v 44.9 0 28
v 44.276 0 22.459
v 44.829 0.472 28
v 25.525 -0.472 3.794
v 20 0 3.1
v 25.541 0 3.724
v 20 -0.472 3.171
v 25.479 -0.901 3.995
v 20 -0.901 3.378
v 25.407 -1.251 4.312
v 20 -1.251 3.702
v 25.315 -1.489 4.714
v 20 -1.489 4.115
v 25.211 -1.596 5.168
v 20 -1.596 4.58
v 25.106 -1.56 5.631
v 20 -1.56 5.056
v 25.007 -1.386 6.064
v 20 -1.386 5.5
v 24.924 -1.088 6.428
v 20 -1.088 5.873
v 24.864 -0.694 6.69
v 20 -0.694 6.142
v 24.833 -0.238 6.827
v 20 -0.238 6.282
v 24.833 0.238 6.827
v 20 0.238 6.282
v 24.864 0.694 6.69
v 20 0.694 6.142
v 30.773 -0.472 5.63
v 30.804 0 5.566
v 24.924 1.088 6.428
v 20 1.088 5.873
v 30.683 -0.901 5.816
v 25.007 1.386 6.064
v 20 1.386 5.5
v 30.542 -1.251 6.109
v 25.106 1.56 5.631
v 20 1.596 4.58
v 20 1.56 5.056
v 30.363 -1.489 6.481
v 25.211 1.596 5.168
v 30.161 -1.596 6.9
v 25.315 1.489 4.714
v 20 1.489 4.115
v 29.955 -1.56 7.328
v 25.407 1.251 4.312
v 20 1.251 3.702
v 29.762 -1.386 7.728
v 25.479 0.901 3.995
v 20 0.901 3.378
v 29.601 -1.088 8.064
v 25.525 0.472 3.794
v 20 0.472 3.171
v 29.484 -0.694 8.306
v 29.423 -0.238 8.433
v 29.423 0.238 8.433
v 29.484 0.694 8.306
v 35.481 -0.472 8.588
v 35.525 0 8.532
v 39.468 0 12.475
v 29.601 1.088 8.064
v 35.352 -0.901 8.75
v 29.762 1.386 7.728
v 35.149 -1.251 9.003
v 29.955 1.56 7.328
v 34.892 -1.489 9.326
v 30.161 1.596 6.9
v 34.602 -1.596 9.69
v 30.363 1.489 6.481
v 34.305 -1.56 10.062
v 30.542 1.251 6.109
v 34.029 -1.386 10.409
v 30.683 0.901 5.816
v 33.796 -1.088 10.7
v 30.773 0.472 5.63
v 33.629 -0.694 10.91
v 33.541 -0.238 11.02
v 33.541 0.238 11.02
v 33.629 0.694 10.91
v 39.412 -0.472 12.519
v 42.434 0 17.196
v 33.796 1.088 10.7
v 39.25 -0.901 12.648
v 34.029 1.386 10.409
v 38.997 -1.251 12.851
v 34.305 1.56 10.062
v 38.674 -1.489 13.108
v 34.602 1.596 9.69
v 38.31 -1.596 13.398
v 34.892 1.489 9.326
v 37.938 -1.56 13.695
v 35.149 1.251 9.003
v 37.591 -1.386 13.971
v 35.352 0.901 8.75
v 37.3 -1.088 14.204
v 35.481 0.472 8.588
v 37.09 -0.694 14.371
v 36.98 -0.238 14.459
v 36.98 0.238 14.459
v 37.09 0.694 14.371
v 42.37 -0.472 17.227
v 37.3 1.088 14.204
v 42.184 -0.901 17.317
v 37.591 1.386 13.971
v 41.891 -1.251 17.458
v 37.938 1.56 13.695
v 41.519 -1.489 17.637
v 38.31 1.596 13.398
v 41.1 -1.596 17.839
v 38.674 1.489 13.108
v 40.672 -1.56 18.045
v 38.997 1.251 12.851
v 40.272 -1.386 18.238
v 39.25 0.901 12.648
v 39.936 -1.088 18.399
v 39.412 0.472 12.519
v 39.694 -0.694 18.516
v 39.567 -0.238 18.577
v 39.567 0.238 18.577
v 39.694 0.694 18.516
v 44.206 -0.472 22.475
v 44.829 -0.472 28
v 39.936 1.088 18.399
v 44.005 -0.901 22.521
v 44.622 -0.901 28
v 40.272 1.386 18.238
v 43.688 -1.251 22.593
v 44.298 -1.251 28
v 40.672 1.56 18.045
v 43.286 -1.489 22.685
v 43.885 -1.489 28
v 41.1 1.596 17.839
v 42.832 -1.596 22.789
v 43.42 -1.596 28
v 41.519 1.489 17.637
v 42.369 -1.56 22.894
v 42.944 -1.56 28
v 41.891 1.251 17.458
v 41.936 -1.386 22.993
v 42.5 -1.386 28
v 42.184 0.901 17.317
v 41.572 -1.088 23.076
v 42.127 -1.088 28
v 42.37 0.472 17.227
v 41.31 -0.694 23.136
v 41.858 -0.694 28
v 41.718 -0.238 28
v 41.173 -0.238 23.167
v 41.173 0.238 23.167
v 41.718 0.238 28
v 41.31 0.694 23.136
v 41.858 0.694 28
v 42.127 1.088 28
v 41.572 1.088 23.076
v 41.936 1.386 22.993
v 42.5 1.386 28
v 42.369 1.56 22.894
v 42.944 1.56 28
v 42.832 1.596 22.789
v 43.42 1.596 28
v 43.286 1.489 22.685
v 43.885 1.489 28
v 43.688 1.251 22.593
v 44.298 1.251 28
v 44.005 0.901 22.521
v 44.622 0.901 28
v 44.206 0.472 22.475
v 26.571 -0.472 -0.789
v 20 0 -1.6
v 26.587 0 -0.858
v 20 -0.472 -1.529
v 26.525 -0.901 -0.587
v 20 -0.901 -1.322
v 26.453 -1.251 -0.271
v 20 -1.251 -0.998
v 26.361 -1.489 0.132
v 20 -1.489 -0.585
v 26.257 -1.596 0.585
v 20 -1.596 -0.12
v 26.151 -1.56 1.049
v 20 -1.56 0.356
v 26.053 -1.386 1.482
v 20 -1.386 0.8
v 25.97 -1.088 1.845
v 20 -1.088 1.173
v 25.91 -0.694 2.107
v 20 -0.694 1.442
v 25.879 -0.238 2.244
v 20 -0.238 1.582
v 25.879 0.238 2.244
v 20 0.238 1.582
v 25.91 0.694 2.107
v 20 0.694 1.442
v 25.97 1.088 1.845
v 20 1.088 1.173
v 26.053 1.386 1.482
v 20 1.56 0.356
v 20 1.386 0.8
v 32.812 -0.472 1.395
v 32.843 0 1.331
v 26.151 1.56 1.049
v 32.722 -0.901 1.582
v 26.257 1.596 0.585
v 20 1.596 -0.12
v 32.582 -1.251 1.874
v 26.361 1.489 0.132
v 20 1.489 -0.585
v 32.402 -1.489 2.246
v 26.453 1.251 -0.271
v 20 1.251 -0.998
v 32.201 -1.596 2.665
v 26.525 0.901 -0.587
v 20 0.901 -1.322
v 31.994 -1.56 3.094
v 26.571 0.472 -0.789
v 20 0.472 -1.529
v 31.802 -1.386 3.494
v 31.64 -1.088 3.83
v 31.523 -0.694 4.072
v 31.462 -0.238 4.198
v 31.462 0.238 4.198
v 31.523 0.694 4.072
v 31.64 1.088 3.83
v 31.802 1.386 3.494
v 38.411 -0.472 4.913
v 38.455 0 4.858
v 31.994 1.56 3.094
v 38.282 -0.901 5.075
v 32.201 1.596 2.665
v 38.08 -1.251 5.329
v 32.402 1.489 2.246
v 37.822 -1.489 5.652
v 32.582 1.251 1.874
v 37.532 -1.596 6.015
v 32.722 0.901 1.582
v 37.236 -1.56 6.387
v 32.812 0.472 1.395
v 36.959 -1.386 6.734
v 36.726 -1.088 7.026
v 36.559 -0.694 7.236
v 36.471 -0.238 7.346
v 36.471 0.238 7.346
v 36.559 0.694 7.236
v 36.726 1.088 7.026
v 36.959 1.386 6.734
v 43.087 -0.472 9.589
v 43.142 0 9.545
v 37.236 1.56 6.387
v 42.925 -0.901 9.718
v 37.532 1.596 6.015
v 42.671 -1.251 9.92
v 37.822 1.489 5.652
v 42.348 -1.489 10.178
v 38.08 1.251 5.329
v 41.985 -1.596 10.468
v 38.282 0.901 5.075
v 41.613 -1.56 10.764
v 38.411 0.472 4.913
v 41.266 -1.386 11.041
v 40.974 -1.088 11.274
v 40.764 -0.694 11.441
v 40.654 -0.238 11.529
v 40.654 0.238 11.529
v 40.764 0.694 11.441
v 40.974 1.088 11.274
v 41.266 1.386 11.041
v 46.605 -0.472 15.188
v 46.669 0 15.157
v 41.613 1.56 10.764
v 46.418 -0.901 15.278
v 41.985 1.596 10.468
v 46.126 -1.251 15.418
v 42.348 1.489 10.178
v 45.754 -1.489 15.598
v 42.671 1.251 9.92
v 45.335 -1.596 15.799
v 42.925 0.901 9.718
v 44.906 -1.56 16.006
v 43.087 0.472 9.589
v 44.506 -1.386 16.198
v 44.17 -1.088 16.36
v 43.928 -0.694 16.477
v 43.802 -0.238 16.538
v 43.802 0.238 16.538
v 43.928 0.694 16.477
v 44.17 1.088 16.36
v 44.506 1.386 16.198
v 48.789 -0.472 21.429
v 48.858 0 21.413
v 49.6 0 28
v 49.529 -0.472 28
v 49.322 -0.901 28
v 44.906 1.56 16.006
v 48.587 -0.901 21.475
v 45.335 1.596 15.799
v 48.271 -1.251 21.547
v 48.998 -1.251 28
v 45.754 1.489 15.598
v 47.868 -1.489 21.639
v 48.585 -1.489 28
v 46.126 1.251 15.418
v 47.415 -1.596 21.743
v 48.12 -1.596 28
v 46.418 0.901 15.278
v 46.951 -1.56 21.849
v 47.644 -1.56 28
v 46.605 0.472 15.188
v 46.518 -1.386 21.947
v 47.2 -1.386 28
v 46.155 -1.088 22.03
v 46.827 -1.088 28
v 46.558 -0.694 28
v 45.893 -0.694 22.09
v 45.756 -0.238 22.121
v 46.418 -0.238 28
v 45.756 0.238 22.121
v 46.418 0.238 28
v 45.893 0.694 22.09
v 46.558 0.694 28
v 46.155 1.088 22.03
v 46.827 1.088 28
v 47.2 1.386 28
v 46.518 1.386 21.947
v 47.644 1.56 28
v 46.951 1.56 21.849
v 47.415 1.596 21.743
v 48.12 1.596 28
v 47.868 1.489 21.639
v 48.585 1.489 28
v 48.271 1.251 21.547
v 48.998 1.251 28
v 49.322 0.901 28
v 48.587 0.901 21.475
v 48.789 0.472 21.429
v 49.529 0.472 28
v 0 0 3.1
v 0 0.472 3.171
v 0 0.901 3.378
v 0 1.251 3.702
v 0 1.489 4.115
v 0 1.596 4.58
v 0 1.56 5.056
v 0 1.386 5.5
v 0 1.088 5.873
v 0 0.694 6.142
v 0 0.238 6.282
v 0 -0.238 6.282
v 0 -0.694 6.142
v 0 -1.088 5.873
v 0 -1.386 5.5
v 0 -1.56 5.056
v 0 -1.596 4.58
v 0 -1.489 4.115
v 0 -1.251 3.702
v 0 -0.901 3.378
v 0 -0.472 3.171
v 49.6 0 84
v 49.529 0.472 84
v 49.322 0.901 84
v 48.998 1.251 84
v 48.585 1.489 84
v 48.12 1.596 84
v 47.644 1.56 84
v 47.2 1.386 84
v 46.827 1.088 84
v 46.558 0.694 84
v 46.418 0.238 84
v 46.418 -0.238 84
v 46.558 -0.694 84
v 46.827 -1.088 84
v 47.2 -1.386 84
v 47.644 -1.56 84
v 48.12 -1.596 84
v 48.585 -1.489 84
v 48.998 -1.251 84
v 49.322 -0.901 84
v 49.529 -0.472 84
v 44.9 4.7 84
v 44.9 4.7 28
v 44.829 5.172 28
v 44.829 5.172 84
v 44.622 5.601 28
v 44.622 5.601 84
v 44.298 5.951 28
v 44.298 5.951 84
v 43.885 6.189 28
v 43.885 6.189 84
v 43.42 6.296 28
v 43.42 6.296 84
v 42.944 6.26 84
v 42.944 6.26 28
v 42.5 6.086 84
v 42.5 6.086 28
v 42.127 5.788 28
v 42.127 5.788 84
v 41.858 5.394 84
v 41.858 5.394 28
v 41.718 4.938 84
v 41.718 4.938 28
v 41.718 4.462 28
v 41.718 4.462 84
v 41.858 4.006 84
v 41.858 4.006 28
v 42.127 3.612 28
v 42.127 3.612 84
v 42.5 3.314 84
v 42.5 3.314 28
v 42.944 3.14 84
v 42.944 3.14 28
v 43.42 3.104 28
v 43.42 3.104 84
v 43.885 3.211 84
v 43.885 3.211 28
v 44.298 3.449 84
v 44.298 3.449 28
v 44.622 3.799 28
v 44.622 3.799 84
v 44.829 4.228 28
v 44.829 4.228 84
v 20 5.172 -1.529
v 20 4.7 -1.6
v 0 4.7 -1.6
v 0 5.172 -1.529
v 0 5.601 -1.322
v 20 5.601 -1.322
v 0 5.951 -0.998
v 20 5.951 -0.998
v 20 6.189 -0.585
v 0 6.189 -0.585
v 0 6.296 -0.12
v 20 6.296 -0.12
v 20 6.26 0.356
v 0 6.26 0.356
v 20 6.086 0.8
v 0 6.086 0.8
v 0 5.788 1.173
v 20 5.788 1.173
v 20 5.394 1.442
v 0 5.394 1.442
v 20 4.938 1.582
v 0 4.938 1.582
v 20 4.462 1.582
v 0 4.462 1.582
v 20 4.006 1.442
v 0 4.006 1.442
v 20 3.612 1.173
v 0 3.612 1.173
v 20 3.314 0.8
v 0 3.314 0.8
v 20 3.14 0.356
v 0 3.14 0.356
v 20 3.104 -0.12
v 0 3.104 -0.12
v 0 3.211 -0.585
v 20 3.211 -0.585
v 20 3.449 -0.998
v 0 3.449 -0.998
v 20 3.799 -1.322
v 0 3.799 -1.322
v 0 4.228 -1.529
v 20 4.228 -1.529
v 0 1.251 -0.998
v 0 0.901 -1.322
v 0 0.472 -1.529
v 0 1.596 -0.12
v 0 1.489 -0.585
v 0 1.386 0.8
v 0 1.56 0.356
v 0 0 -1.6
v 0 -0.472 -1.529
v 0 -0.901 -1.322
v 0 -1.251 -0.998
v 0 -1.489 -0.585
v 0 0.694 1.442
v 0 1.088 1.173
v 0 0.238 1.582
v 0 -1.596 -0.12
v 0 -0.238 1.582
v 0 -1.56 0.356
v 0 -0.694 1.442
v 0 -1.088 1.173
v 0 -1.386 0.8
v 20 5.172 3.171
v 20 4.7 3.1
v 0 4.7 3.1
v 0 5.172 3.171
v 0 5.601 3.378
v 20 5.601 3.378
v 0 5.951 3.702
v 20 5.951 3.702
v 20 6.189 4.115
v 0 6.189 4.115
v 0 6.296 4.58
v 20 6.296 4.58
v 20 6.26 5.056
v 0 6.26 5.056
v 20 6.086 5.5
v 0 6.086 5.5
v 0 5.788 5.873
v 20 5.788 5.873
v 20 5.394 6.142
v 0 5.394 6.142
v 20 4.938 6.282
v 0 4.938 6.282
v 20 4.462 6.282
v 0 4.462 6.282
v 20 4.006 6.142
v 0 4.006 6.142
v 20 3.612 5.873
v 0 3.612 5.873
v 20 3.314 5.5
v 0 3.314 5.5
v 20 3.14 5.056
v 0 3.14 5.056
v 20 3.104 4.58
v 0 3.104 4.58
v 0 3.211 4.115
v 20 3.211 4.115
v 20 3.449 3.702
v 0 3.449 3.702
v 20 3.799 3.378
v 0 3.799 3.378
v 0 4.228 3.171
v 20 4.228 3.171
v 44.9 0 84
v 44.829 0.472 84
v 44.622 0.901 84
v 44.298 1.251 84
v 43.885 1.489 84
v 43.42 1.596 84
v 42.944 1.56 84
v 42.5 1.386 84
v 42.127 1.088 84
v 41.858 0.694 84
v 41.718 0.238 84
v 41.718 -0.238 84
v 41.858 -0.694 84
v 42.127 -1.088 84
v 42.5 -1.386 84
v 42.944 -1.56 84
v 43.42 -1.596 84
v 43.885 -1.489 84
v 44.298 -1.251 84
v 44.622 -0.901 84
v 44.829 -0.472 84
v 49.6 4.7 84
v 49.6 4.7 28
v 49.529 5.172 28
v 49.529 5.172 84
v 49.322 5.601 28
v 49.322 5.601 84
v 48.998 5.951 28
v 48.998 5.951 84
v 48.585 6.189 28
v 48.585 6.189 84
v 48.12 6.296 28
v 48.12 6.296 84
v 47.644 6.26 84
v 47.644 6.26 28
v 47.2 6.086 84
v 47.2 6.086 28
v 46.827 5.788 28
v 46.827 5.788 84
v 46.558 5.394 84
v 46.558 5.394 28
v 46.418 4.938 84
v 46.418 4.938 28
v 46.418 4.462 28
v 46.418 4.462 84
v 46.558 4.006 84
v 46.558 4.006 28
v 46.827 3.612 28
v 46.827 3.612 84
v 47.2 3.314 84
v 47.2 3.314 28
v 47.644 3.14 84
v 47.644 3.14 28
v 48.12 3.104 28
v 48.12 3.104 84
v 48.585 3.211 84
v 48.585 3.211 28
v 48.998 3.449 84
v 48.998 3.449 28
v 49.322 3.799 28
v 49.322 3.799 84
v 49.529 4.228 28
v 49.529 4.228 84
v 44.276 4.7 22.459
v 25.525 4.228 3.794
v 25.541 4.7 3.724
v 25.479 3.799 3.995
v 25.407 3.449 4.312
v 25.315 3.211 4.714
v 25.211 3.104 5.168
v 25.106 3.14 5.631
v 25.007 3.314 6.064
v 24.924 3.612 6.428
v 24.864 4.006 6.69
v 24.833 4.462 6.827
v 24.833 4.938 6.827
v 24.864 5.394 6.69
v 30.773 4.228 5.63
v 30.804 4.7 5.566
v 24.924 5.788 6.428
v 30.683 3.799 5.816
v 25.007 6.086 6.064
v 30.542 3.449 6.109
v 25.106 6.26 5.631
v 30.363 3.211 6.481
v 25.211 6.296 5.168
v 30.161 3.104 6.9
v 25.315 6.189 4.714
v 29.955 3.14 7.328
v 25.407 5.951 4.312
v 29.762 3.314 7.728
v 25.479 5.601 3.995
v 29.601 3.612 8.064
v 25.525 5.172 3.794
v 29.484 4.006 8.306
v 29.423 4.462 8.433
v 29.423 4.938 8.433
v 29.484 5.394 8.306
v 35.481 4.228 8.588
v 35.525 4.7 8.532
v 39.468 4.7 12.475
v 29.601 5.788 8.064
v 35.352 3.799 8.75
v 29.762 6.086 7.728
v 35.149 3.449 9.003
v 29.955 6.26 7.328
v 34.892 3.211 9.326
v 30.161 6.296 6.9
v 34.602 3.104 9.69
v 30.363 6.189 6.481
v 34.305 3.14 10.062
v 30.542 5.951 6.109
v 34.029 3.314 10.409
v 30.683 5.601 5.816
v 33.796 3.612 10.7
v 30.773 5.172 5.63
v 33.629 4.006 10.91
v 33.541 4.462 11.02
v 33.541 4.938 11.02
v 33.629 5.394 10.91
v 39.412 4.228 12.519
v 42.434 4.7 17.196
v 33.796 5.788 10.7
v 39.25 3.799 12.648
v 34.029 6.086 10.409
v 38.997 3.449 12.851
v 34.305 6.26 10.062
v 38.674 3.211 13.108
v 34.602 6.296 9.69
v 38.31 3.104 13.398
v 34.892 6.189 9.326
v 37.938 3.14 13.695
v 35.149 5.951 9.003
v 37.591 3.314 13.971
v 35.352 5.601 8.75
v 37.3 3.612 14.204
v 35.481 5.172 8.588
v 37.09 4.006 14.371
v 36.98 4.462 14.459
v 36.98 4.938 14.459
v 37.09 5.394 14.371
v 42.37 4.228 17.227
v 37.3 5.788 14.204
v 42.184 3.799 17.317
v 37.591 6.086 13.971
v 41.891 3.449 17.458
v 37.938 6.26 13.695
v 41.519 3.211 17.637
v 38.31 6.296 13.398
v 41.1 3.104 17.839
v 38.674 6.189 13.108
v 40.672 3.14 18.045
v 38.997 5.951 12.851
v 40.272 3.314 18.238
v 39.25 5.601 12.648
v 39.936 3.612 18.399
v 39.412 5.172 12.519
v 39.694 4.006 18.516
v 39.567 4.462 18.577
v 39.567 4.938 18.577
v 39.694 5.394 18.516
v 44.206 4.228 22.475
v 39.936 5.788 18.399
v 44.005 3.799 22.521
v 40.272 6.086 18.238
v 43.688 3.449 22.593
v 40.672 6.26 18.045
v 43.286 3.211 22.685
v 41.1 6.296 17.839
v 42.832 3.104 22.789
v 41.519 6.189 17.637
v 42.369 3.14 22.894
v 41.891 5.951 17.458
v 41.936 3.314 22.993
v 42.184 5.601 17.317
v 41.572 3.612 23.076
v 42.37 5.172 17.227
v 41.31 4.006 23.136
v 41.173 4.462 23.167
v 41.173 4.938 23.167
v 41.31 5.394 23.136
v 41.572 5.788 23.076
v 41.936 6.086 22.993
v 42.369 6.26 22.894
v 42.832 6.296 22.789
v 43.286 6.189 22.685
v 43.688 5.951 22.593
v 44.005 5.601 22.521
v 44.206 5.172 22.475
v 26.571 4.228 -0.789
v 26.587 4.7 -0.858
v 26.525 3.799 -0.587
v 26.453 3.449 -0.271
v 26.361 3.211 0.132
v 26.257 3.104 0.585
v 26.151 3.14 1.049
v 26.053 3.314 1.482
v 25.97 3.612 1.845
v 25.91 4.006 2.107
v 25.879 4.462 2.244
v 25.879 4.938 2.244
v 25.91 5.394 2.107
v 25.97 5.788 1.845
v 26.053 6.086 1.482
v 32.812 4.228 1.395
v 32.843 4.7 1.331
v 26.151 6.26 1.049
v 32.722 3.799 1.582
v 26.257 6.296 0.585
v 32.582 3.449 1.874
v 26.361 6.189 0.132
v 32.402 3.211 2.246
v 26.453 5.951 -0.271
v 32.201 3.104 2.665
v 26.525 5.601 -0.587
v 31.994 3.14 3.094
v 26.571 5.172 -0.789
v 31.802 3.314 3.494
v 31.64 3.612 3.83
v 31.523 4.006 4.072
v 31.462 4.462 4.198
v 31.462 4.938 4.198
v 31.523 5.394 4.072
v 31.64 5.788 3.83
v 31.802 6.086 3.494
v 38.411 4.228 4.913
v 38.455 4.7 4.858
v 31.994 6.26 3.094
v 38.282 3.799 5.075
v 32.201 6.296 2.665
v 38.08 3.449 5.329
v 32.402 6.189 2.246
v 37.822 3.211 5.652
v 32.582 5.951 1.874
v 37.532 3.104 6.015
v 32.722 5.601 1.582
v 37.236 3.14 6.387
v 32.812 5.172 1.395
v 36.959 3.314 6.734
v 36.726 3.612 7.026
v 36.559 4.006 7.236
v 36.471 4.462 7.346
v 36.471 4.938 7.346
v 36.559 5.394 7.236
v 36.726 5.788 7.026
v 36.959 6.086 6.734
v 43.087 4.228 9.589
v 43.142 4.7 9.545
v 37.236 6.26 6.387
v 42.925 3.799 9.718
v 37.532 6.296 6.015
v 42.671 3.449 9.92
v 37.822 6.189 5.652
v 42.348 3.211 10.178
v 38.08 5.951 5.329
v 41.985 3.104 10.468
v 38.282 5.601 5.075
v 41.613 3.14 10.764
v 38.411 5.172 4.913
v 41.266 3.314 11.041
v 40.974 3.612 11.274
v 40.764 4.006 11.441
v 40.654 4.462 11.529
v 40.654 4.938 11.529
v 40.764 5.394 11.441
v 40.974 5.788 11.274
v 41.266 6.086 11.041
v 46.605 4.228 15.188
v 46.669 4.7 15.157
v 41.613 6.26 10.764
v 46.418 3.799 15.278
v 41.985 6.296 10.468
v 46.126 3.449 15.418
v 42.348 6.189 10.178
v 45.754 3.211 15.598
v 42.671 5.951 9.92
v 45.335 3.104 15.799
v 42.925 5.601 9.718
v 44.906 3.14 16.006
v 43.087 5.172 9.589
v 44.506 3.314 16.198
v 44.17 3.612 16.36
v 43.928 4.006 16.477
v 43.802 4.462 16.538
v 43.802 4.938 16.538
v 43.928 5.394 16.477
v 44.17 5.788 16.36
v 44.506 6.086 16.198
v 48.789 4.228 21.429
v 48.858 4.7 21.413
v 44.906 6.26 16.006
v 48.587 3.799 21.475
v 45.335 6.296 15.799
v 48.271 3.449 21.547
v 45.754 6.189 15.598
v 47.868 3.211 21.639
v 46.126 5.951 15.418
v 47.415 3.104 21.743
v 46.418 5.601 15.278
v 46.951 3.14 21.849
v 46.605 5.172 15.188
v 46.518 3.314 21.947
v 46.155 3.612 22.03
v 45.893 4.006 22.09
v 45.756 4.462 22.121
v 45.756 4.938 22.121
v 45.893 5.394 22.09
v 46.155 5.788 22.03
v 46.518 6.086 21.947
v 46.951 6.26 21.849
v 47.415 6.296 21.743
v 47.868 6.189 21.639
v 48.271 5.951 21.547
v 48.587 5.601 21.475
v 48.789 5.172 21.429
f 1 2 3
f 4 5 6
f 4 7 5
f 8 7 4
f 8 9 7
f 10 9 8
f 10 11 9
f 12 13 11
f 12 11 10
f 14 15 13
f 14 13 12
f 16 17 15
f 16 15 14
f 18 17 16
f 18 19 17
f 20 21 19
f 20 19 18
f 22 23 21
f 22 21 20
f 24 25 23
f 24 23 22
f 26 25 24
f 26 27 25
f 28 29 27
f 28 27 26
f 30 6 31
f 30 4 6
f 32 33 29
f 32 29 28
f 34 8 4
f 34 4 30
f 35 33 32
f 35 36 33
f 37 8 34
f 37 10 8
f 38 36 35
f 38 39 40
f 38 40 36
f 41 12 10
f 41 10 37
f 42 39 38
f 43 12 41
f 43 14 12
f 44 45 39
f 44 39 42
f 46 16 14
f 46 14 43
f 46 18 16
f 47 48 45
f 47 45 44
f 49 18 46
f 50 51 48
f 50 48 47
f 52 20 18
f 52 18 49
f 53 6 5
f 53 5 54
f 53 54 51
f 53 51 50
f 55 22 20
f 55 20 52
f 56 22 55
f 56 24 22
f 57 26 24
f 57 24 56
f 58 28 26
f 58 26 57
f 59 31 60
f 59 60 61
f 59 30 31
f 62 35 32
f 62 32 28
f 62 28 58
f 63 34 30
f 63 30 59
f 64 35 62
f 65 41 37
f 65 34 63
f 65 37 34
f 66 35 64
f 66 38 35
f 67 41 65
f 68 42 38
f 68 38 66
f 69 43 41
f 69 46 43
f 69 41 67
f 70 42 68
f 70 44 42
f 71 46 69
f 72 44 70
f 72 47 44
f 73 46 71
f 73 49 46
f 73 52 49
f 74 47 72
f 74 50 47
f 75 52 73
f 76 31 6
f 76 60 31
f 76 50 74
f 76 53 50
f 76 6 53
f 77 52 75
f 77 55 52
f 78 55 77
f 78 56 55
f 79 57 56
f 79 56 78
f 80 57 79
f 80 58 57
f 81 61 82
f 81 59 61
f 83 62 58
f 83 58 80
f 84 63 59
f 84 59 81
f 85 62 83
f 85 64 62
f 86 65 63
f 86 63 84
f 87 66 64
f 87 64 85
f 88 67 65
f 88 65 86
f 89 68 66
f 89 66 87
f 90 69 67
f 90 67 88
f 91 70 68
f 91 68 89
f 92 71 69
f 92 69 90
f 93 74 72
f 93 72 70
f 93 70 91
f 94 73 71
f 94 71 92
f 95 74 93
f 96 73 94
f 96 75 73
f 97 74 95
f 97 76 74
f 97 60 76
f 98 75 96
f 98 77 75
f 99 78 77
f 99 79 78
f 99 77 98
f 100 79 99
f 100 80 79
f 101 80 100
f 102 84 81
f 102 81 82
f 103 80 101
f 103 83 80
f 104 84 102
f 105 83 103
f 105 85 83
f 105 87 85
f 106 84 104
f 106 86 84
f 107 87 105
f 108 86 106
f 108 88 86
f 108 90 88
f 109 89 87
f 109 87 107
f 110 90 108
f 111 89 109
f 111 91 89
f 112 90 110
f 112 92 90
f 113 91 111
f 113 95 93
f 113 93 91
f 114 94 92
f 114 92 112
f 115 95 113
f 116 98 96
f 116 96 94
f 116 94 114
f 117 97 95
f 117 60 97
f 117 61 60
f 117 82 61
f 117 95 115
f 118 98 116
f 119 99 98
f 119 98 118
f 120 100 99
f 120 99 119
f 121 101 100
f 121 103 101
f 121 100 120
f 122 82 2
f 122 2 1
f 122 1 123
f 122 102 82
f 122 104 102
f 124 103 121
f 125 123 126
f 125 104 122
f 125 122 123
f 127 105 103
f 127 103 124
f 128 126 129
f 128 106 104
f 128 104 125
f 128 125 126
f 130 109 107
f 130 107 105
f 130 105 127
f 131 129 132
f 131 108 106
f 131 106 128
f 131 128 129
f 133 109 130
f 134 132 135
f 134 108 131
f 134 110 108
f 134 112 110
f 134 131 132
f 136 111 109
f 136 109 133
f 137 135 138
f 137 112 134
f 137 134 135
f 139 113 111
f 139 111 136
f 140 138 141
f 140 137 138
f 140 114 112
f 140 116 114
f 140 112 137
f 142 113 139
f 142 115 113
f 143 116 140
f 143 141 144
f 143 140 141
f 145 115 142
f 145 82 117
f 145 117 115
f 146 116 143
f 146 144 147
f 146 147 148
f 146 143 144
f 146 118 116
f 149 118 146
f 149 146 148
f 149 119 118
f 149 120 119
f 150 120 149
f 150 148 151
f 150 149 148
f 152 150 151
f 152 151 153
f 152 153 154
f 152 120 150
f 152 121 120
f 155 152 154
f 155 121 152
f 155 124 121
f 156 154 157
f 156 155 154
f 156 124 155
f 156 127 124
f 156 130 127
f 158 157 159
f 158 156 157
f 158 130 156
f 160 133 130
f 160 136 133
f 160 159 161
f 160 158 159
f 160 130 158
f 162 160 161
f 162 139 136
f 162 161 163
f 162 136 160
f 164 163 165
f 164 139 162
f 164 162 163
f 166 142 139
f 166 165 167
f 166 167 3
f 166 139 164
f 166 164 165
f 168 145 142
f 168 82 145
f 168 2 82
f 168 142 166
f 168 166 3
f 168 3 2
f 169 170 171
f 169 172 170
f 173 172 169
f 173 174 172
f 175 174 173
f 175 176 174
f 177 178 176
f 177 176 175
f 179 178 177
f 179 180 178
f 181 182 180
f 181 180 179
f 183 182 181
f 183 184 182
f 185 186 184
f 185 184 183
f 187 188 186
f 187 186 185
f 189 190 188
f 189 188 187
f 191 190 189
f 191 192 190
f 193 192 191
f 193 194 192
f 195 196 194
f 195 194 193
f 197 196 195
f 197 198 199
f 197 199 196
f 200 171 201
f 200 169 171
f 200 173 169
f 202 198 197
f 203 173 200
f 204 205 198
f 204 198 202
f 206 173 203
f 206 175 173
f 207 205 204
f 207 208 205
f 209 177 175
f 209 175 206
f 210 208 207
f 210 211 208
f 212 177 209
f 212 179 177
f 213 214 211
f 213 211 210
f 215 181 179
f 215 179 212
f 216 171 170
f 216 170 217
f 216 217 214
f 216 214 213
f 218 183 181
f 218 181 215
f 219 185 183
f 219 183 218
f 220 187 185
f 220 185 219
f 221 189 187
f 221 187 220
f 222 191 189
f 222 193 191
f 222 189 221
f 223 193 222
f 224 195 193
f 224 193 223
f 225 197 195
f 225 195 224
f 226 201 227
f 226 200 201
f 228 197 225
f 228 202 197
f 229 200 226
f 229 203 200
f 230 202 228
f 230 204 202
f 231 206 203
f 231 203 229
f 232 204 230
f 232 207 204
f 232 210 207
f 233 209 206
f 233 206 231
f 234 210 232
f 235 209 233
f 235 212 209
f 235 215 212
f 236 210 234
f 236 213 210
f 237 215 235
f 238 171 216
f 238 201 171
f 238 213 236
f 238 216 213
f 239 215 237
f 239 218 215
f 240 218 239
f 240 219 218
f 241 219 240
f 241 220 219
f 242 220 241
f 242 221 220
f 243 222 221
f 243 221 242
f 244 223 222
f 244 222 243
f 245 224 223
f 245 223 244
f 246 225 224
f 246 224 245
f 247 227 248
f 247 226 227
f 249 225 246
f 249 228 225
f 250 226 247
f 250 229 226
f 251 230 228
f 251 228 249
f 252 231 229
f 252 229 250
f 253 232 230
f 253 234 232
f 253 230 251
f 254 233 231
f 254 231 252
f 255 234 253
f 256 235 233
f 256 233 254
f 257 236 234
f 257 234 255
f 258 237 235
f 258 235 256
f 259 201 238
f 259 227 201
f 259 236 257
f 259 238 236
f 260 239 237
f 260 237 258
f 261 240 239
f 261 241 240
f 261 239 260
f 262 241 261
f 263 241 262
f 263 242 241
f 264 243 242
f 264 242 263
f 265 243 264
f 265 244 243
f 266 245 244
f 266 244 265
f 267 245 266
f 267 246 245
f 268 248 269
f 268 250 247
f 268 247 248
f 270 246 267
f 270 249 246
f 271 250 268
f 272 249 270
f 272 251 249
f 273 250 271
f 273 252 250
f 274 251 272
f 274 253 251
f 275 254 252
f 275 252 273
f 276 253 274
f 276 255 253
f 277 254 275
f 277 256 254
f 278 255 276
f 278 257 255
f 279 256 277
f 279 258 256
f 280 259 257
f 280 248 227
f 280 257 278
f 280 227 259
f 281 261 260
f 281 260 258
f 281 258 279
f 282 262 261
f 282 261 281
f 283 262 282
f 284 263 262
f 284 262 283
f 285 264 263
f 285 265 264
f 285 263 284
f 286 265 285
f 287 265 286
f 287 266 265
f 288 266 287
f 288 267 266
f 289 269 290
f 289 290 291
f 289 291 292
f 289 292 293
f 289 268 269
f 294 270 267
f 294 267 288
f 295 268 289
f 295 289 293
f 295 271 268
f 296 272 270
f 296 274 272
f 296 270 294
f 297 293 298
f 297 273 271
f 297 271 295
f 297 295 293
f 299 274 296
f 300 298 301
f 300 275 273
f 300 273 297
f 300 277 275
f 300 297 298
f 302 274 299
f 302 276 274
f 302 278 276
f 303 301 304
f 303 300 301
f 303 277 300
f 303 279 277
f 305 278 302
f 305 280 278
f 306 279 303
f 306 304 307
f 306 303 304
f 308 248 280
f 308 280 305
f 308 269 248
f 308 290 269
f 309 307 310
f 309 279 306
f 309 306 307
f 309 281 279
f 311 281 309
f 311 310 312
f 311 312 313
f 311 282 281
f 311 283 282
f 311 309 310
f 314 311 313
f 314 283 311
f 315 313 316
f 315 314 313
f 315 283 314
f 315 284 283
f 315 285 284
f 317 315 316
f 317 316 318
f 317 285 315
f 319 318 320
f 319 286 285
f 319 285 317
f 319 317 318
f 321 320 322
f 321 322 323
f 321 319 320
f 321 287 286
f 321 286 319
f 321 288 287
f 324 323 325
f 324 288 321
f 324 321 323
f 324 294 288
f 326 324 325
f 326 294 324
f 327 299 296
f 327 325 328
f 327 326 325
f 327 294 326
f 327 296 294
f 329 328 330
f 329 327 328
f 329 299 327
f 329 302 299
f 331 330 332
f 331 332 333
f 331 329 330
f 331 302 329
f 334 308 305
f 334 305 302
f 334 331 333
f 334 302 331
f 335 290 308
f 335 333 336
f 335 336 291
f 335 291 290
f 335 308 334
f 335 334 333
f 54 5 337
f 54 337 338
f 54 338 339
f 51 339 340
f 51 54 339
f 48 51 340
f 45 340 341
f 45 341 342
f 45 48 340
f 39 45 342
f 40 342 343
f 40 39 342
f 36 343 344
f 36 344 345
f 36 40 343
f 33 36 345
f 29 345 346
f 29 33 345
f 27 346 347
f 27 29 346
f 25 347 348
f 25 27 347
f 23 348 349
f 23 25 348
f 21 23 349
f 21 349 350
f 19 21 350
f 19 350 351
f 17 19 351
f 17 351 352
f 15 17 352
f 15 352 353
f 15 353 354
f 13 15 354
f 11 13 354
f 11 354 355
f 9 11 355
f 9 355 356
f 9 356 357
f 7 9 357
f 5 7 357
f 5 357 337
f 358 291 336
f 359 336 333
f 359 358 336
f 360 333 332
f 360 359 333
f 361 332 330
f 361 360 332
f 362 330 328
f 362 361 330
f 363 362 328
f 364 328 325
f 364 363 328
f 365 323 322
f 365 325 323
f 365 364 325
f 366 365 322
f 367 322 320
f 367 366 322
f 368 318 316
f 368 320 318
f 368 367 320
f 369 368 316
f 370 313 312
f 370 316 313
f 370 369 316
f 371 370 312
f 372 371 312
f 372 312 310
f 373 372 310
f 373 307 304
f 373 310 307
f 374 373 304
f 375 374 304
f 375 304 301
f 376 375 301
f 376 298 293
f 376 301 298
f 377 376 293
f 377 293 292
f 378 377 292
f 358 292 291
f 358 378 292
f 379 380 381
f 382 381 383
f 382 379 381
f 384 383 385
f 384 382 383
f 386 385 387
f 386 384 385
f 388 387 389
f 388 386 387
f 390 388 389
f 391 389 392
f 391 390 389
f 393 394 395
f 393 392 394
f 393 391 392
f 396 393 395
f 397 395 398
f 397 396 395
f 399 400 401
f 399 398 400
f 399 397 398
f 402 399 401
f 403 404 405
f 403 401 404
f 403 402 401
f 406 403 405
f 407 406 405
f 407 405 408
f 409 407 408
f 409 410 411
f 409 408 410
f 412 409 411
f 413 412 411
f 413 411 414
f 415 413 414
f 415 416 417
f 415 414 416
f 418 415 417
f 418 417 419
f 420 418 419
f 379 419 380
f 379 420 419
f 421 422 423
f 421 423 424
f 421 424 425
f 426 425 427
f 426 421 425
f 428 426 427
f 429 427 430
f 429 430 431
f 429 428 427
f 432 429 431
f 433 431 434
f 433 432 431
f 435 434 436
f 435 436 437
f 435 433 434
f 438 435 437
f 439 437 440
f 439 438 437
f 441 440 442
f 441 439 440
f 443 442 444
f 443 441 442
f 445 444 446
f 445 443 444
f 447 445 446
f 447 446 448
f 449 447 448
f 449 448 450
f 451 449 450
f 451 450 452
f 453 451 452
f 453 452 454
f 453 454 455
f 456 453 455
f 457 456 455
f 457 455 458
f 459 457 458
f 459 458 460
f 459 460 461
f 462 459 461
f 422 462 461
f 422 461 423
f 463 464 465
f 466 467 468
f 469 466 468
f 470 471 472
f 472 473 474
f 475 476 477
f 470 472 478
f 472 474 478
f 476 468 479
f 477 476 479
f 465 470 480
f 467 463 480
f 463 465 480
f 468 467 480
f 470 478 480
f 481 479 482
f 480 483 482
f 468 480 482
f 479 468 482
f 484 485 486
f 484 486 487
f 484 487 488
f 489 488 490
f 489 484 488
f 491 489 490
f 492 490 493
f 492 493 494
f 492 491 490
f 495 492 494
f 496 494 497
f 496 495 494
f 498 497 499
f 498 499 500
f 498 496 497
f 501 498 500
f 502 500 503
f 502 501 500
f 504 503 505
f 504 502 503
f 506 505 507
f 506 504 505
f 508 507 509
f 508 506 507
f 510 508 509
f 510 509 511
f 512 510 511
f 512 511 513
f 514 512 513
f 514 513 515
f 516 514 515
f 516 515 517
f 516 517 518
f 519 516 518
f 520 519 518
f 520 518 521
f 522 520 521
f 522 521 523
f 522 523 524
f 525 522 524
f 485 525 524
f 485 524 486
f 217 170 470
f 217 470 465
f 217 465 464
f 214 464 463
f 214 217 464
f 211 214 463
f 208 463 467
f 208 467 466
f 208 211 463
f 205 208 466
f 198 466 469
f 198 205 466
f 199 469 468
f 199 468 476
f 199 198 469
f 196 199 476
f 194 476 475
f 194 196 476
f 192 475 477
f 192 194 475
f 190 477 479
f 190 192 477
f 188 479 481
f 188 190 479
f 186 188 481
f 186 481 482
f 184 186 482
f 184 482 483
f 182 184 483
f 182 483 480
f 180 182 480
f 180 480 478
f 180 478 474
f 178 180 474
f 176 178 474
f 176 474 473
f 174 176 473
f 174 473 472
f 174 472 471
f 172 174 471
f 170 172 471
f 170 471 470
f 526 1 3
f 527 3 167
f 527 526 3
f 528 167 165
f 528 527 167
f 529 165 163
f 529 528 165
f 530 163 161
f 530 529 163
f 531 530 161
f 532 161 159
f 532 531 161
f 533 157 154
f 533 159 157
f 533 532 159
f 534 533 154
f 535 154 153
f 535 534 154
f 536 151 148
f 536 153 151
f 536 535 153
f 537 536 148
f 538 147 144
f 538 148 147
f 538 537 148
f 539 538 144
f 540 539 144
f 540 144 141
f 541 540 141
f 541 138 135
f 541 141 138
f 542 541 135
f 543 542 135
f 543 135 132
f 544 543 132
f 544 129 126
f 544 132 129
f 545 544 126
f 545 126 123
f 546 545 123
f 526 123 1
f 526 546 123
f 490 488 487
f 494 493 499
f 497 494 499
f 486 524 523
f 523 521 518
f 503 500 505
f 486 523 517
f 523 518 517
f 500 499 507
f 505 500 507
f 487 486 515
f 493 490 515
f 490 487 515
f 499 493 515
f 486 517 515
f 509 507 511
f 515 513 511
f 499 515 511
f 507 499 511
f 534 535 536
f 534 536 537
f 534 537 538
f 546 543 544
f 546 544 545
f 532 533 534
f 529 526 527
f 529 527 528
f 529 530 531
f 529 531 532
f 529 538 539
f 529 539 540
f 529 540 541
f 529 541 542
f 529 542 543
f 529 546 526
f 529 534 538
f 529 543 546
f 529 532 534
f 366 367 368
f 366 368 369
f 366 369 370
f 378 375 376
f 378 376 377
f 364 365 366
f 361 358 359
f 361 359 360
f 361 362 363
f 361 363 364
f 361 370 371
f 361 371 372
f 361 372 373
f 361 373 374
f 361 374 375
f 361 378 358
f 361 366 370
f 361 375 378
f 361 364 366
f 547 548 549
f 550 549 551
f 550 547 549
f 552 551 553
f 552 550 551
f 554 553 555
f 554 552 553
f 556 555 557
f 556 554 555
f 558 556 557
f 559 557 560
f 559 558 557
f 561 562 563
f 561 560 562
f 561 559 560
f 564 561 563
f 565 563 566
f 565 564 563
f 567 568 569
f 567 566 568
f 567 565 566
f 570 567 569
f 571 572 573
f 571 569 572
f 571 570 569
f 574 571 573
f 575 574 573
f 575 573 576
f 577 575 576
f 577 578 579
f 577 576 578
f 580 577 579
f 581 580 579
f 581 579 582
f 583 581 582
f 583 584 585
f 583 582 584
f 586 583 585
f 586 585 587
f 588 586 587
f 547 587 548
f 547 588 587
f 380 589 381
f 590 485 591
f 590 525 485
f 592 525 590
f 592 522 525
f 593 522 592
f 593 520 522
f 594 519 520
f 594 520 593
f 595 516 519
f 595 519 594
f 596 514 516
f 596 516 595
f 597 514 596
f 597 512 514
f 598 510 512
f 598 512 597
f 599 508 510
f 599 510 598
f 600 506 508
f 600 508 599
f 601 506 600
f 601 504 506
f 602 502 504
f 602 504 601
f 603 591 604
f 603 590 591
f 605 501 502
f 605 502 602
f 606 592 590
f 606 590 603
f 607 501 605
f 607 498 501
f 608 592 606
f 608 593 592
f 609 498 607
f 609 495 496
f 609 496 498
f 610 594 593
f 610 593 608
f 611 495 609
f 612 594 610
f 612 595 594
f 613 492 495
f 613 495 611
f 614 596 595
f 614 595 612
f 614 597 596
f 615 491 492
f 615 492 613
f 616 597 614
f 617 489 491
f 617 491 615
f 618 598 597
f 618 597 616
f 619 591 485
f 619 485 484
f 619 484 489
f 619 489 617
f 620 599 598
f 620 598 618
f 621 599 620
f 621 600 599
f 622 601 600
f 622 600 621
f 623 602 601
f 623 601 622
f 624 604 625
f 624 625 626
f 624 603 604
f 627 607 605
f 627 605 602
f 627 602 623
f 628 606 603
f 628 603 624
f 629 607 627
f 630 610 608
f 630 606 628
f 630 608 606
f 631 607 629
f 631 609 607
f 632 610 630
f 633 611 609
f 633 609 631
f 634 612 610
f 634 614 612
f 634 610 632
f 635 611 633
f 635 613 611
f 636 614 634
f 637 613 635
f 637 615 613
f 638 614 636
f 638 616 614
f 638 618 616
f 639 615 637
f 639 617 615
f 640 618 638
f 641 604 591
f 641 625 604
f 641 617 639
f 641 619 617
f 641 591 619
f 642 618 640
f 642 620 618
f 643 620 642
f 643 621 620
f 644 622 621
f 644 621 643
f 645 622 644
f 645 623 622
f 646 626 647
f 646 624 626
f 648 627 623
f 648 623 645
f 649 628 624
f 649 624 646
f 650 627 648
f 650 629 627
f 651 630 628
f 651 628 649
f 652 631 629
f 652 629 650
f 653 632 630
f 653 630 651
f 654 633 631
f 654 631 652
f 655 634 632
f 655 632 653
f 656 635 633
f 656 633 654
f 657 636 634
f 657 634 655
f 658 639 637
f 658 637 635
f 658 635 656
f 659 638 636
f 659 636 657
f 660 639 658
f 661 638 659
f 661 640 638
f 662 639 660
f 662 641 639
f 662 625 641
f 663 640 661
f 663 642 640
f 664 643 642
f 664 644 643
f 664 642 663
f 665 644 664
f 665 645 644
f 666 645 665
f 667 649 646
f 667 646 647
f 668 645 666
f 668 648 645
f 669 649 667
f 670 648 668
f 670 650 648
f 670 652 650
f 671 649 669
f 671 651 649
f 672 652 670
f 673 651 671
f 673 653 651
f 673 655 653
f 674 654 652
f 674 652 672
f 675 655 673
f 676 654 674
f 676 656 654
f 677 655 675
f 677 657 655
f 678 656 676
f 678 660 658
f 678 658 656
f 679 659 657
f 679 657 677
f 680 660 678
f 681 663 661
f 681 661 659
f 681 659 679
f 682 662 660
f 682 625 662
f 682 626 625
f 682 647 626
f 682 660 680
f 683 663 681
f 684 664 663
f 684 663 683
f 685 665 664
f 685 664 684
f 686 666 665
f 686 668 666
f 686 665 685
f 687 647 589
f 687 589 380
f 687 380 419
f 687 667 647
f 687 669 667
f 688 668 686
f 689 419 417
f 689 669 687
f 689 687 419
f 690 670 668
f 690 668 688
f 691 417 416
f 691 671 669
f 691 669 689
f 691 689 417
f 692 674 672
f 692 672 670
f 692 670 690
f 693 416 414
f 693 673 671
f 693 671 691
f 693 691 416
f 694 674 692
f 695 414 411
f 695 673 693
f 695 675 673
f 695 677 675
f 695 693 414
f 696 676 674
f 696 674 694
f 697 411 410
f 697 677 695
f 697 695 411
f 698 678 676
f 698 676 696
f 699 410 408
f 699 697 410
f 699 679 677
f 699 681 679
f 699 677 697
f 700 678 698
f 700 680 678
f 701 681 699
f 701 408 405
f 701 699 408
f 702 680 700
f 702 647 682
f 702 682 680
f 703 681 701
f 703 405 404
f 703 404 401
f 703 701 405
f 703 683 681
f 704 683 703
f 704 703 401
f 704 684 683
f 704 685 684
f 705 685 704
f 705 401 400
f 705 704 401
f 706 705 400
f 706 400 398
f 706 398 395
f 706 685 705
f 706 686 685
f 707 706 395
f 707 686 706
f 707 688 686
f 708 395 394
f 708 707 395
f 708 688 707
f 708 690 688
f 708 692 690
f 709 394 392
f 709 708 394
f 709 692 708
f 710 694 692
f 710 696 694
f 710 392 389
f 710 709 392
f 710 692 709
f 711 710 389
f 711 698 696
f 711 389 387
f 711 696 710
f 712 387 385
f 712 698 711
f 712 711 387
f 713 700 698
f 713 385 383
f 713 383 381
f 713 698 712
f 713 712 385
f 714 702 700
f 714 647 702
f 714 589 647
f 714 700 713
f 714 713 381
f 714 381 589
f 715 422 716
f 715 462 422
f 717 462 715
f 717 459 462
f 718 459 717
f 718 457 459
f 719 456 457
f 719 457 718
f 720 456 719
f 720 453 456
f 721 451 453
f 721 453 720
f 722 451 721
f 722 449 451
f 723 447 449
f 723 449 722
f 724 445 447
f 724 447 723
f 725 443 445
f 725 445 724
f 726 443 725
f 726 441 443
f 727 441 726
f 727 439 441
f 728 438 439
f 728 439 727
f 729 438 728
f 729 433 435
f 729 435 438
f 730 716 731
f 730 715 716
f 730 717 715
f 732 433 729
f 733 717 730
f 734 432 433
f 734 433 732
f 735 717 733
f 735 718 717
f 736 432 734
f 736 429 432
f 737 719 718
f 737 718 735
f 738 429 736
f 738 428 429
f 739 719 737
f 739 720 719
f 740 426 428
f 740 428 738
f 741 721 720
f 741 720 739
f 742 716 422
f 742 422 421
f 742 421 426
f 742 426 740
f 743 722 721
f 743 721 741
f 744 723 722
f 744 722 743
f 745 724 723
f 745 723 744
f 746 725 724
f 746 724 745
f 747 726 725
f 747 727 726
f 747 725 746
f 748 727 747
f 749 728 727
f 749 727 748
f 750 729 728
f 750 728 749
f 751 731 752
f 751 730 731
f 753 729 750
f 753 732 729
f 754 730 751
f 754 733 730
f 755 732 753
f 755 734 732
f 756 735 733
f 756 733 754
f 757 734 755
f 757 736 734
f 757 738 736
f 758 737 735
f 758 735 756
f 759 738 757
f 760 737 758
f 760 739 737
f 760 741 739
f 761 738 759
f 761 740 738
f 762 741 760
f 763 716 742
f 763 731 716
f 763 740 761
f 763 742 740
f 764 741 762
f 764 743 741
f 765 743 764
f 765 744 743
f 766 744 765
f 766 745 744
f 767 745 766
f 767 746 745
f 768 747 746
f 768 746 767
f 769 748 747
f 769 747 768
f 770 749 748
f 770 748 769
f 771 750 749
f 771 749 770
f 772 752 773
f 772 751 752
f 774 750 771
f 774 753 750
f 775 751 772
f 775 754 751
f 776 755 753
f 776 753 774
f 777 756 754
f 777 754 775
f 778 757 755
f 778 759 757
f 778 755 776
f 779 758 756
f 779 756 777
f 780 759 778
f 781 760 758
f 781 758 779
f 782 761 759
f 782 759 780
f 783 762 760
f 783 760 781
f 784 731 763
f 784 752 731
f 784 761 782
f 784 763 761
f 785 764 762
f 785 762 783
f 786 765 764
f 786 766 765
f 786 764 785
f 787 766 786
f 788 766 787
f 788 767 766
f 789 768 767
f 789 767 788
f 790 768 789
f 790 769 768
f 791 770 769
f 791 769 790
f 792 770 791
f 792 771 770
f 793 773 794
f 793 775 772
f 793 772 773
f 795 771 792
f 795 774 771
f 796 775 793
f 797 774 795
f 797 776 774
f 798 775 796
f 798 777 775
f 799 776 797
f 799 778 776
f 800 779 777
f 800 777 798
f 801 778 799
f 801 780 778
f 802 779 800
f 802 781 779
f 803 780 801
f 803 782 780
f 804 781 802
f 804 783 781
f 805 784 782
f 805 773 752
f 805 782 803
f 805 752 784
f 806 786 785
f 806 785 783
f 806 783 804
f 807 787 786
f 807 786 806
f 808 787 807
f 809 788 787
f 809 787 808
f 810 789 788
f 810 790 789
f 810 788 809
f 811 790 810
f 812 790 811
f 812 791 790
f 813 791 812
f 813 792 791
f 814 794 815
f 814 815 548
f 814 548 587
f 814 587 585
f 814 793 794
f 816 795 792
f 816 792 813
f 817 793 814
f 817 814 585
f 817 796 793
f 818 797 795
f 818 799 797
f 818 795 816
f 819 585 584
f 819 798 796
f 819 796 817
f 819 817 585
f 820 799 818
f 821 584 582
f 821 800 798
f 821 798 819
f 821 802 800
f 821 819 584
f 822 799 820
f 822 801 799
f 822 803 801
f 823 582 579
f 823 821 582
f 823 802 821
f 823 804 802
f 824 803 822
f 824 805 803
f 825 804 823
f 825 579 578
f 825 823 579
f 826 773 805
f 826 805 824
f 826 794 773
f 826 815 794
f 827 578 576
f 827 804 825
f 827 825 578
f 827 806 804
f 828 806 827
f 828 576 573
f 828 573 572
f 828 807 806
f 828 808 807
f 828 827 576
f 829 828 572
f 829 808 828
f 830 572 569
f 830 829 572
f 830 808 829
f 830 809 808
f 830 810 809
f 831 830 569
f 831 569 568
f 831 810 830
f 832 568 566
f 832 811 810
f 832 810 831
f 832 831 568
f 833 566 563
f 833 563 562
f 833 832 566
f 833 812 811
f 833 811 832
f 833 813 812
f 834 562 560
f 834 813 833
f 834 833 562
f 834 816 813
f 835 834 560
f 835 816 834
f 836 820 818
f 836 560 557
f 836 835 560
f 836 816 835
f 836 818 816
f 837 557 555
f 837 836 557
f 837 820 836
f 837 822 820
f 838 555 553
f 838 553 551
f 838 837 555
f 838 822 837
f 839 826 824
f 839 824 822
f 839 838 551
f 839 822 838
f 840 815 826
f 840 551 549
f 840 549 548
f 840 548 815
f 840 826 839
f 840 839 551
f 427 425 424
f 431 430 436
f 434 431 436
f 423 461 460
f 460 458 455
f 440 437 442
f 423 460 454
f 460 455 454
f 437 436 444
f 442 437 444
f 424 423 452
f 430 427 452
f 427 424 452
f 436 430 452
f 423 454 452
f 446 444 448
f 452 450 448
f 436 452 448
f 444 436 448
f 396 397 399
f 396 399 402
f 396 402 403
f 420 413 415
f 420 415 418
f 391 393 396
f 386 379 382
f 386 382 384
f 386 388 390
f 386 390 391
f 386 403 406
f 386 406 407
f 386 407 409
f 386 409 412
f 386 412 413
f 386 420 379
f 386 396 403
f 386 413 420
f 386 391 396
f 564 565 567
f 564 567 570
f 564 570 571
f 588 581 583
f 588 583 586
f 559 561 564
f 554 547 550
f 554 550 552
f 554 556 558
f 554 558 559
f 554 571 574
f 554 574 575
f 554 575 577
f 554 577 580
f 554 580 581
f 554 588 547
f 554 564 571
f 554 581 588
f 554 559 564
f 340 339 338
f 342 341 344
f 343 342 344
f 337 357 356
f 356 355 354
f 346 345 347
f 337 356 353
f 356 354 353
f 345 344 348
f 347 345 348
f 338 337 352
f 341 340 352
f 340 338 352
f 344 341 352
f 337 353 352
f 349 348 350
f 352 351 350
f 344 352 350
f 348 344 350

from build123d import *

# Parameters (mm, degrees)
SKETCH2_R       = 1.6
LPATTERN1_COUNT = 2
LPATTERN1_PITCH = 4.7


with BuildPart() as part:
    # Sweep1: sweep along a path in Sketch1
    with BuildLine(Plane(origin=(0, 0, 0), x_dir=(1, 0, 0), z_dir=(0, 1, 0))) as sweep1_path:
        Line((0, 0), (20, 0))
        ThreePointArc((20, 0), (39.798989873, -8.201010127), (48, -28))
        Line((48, -28), (48, -84))
    # Sketch2 → Sweep1 (sweep)
    with BuildSketch(Plane(origin=(0, 0, 0), x_dir=(0, 0, -1), z_dir=(1, 0, 0))):
        Circle(SKETCH2_R)
        with Locations((-4.7, 0)):
            Circle(SKETCH2_R)
    sweep1 = sweep(path=sweep1_path.line)


with BuildPart() as lpattern1_1:
    # LPattern1: Sweep1 ×2
    with Locations(*[(0, i * LPATTERN1_PITCH, 0) for i in range(1, LPATTERN1_COUNT)]):
        add(sweep1)


solid = Compound([part.part, lpattern1_1.part])
